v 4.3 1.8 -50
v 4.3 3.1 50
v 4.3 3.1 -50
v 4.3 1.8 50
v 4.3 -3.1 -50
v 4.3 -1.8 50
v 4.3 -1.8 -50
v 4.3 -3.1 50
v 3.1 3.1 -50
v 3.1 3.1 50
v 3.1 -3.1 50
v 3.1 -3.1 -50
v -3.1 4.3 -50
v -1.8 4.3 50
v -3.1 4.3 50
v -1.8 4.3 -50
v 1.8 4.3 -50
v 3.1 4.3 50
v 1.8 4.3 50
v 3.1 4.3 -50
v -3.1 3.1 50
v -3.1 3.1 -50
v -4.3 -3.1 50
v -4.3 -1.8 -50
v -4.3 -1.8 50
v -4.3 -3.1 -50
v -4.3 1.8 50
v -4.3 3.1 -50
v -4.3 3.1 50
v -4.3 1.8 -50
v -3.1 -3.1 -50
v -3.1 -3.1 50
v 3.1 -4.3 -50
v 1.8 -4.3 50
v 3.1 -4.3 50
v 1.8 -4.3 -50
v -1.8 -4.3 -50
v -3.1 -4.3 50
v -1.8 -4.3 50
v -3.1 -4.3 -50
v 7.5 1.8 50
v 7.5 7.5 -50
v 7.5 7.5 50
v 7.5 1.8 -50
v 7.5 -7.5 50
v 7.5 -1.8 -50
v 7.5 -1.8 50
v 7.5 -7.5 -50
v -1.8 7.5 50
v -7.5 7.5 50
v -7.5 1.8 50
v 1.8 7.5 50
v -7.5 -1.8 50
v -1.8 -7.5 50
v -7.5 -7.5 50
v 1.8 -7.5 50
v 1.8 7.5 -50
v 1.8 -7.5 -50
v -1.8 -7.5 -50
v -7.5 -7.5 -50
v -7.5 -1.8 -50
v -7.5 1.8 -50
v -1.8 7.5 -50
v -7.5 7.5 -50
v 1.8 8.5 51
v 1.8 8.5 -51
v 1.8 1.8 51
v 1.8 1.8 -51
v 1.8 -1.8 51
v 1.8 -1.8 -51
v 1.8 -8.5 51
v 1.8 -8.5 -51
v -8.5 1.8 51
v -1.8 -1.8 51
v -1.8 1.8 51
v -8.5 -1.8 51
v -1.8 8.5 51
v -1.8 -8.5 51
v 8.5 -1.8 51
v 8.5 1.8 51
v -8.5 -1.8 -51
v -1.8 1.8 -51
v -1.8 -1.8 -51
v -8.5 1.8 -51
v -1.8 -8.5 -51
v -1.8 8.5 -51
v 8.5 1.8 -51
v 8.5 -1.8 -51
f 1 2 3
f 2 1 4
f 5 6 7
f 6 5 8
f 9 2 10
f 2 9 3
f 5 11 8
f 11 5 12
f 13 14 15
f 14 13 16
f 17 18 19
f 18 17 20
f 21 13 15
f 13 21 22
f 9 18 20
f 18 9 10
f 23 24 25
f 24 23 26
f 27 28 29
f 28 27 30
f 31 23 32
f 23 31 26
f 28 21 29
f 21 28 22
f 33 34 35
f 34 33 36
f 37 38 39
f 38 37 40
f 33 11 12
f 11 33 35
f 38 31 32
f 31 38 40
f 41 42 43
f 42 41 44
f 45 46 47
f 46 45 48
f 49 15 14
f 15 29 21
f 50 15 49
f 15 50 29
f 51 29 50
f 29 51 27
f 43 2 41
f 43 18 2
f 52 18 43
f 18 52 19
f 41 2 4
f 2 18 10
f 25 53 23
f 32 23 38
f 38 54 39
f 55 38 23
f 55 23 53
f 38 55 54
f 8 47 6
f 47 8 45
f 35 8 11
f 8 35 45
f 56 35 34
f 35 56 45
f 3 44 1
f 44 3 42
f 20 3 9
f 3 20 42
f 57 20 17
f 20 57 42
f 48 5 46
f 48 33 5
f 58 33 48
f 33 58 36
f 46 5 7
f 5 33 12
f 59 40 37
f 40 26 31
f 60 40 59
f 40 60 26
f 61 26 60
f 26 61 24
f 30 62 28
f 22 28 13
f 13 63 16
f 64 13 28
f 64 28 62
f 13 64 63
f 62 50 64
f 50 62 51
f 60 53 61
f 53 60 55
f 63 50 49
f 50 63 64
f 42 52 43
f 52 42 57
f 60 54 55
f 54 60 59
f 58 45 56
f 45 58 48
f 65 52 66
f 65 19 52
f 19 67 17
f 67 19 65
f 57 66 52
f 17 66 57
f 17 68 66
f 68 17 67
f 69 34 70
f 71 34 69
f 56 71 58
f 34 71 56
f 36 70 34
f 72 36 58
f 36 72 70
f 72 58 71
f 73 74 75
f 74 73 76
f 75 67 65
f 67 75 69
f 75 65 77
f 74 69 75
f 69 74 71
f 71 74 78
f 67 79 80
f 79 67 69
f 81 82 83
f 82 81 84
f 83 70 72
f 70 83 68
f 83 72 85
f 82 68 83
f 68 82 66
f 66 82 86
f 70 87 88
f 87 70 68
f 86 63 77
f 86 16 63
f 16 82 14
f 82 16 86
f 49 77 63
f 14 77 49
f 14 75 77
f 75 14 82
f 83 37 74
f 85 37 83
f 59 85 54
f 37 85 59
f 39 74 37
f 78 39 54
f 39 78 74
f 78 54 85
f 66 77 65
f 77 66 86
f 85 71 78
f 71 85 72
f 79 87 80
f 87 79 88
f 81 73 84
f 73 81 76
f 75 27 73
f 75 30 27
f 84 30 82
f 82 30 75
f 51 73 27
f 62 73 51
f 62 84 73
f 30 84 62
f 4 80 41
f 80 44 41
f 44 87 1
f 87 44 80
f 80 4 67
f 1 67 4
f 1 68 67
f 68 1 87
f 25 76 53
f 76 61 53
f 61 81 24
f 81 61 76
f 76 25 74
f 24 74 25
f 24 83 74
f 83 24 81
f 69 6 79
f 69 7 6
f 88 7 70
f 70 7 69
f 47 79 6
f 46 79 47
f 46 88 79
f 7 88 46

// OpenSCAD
// Aluminium extrusion profile (simplified 1515-style), 15mm x 15mm cross-section, 100mm long
// FIX: enforce ONE connected solid by adding a small internal web that bridges the 4 quadrants
// and guarantees the two long parallel segments + corner quadrants are physically attached.

$fn = 96;

// Target dimensions
cross_section_width_mm  = 15.0;
cross_section_height_mm = 15.0;
length_mm               = 100.0;

// Profile parameters
wall_mm                 = 1.6;
slot_opening_width_mm   = 3.2;
slot_depth_mm           = 4.2;
slot_neck_width_mm      = 6.2;
slot_neck_depth_mm      = 2.2;

center_bore_diameter_mm = 4.2;

// Connectivity overlap (use 1–2mm as requested)
overlap_mm = 1.0;

module extrusion_1515(w=15, h=15, L=100) {
    s = min(w, h);
    half = s/2;

    // Clamp depths so cuts cannot reach/overcut the center and fragment the body
    max_total_depth = half - wall_mm;
    d1 = min(slot_depth_mm, max_total_depth);
    d2 = min(slot_neck_depth_mm, max(0, max_total_depth - d1));

    // Clamp widths so they don't remove too much near corners
    max_open_w = s - 2*wall_mm;
    w1 = min(slot_opening_width_mm, max_open_w);
    w2 = min(slot_neck_width_mm,    max_open_w);

    // --- Connectivity web (added material) ---
    // This bridges the four quadrant pieces at the center and also ties any long parallel
    // internal segments into one continuous body. Keep it small so the design stays the same.
    web_th = max(1.2, wall_mm);          // web thickness
    web_len = L + 2*overlap_mm;          // ensure it overlaps along Z

    union() {
        difference() {
            // Main body
            cube([w, h, L], center=true);

            // Center bore
            cylinder(d=center_bore_diameter_mm, h=L + 2*overlap_mm, center=true);

            // 4 T-slots (one per side), cut as two-stage pockets
            for (a = [0, 90, 180, 270]) {
                rotate([0, 0, a]) {
                    // Stage 1: narrow mouth pocket, touches the outer face
                    translate([half - d1/2, 0, 0])
                        cube([d1 + 2*overlap_mm, w1, L + 2*overlap_mm], center=true);

                    // Stage 2: wider internal pocket
                    if (d2 > 0)
                        translate([half - d1 - d2/2, 0, 0])
                            cube([d2 + 2*overlap_mm, w2, L + 2*overlap_mm], center=true);
                }
            }
        }

        // Add a small "+" web at the center to eliminate any separation between quadrants
        // and to ensure any internal long bars are attached to the main body.
        // Overlaps by overlap_mm in all directions to guarantee manifold union.
        cube([web_th + 2*overlap_mm, s + 2*overlap_mm, web_len], center=true);
        cube([s + 2*overlap_mm, web_th + 2*overlap_mm, web_len], center=true);
    }
}

color("Silver")
extrusion_1515(cross_section_width_mm, cross_section_height_mm, length_mm);
